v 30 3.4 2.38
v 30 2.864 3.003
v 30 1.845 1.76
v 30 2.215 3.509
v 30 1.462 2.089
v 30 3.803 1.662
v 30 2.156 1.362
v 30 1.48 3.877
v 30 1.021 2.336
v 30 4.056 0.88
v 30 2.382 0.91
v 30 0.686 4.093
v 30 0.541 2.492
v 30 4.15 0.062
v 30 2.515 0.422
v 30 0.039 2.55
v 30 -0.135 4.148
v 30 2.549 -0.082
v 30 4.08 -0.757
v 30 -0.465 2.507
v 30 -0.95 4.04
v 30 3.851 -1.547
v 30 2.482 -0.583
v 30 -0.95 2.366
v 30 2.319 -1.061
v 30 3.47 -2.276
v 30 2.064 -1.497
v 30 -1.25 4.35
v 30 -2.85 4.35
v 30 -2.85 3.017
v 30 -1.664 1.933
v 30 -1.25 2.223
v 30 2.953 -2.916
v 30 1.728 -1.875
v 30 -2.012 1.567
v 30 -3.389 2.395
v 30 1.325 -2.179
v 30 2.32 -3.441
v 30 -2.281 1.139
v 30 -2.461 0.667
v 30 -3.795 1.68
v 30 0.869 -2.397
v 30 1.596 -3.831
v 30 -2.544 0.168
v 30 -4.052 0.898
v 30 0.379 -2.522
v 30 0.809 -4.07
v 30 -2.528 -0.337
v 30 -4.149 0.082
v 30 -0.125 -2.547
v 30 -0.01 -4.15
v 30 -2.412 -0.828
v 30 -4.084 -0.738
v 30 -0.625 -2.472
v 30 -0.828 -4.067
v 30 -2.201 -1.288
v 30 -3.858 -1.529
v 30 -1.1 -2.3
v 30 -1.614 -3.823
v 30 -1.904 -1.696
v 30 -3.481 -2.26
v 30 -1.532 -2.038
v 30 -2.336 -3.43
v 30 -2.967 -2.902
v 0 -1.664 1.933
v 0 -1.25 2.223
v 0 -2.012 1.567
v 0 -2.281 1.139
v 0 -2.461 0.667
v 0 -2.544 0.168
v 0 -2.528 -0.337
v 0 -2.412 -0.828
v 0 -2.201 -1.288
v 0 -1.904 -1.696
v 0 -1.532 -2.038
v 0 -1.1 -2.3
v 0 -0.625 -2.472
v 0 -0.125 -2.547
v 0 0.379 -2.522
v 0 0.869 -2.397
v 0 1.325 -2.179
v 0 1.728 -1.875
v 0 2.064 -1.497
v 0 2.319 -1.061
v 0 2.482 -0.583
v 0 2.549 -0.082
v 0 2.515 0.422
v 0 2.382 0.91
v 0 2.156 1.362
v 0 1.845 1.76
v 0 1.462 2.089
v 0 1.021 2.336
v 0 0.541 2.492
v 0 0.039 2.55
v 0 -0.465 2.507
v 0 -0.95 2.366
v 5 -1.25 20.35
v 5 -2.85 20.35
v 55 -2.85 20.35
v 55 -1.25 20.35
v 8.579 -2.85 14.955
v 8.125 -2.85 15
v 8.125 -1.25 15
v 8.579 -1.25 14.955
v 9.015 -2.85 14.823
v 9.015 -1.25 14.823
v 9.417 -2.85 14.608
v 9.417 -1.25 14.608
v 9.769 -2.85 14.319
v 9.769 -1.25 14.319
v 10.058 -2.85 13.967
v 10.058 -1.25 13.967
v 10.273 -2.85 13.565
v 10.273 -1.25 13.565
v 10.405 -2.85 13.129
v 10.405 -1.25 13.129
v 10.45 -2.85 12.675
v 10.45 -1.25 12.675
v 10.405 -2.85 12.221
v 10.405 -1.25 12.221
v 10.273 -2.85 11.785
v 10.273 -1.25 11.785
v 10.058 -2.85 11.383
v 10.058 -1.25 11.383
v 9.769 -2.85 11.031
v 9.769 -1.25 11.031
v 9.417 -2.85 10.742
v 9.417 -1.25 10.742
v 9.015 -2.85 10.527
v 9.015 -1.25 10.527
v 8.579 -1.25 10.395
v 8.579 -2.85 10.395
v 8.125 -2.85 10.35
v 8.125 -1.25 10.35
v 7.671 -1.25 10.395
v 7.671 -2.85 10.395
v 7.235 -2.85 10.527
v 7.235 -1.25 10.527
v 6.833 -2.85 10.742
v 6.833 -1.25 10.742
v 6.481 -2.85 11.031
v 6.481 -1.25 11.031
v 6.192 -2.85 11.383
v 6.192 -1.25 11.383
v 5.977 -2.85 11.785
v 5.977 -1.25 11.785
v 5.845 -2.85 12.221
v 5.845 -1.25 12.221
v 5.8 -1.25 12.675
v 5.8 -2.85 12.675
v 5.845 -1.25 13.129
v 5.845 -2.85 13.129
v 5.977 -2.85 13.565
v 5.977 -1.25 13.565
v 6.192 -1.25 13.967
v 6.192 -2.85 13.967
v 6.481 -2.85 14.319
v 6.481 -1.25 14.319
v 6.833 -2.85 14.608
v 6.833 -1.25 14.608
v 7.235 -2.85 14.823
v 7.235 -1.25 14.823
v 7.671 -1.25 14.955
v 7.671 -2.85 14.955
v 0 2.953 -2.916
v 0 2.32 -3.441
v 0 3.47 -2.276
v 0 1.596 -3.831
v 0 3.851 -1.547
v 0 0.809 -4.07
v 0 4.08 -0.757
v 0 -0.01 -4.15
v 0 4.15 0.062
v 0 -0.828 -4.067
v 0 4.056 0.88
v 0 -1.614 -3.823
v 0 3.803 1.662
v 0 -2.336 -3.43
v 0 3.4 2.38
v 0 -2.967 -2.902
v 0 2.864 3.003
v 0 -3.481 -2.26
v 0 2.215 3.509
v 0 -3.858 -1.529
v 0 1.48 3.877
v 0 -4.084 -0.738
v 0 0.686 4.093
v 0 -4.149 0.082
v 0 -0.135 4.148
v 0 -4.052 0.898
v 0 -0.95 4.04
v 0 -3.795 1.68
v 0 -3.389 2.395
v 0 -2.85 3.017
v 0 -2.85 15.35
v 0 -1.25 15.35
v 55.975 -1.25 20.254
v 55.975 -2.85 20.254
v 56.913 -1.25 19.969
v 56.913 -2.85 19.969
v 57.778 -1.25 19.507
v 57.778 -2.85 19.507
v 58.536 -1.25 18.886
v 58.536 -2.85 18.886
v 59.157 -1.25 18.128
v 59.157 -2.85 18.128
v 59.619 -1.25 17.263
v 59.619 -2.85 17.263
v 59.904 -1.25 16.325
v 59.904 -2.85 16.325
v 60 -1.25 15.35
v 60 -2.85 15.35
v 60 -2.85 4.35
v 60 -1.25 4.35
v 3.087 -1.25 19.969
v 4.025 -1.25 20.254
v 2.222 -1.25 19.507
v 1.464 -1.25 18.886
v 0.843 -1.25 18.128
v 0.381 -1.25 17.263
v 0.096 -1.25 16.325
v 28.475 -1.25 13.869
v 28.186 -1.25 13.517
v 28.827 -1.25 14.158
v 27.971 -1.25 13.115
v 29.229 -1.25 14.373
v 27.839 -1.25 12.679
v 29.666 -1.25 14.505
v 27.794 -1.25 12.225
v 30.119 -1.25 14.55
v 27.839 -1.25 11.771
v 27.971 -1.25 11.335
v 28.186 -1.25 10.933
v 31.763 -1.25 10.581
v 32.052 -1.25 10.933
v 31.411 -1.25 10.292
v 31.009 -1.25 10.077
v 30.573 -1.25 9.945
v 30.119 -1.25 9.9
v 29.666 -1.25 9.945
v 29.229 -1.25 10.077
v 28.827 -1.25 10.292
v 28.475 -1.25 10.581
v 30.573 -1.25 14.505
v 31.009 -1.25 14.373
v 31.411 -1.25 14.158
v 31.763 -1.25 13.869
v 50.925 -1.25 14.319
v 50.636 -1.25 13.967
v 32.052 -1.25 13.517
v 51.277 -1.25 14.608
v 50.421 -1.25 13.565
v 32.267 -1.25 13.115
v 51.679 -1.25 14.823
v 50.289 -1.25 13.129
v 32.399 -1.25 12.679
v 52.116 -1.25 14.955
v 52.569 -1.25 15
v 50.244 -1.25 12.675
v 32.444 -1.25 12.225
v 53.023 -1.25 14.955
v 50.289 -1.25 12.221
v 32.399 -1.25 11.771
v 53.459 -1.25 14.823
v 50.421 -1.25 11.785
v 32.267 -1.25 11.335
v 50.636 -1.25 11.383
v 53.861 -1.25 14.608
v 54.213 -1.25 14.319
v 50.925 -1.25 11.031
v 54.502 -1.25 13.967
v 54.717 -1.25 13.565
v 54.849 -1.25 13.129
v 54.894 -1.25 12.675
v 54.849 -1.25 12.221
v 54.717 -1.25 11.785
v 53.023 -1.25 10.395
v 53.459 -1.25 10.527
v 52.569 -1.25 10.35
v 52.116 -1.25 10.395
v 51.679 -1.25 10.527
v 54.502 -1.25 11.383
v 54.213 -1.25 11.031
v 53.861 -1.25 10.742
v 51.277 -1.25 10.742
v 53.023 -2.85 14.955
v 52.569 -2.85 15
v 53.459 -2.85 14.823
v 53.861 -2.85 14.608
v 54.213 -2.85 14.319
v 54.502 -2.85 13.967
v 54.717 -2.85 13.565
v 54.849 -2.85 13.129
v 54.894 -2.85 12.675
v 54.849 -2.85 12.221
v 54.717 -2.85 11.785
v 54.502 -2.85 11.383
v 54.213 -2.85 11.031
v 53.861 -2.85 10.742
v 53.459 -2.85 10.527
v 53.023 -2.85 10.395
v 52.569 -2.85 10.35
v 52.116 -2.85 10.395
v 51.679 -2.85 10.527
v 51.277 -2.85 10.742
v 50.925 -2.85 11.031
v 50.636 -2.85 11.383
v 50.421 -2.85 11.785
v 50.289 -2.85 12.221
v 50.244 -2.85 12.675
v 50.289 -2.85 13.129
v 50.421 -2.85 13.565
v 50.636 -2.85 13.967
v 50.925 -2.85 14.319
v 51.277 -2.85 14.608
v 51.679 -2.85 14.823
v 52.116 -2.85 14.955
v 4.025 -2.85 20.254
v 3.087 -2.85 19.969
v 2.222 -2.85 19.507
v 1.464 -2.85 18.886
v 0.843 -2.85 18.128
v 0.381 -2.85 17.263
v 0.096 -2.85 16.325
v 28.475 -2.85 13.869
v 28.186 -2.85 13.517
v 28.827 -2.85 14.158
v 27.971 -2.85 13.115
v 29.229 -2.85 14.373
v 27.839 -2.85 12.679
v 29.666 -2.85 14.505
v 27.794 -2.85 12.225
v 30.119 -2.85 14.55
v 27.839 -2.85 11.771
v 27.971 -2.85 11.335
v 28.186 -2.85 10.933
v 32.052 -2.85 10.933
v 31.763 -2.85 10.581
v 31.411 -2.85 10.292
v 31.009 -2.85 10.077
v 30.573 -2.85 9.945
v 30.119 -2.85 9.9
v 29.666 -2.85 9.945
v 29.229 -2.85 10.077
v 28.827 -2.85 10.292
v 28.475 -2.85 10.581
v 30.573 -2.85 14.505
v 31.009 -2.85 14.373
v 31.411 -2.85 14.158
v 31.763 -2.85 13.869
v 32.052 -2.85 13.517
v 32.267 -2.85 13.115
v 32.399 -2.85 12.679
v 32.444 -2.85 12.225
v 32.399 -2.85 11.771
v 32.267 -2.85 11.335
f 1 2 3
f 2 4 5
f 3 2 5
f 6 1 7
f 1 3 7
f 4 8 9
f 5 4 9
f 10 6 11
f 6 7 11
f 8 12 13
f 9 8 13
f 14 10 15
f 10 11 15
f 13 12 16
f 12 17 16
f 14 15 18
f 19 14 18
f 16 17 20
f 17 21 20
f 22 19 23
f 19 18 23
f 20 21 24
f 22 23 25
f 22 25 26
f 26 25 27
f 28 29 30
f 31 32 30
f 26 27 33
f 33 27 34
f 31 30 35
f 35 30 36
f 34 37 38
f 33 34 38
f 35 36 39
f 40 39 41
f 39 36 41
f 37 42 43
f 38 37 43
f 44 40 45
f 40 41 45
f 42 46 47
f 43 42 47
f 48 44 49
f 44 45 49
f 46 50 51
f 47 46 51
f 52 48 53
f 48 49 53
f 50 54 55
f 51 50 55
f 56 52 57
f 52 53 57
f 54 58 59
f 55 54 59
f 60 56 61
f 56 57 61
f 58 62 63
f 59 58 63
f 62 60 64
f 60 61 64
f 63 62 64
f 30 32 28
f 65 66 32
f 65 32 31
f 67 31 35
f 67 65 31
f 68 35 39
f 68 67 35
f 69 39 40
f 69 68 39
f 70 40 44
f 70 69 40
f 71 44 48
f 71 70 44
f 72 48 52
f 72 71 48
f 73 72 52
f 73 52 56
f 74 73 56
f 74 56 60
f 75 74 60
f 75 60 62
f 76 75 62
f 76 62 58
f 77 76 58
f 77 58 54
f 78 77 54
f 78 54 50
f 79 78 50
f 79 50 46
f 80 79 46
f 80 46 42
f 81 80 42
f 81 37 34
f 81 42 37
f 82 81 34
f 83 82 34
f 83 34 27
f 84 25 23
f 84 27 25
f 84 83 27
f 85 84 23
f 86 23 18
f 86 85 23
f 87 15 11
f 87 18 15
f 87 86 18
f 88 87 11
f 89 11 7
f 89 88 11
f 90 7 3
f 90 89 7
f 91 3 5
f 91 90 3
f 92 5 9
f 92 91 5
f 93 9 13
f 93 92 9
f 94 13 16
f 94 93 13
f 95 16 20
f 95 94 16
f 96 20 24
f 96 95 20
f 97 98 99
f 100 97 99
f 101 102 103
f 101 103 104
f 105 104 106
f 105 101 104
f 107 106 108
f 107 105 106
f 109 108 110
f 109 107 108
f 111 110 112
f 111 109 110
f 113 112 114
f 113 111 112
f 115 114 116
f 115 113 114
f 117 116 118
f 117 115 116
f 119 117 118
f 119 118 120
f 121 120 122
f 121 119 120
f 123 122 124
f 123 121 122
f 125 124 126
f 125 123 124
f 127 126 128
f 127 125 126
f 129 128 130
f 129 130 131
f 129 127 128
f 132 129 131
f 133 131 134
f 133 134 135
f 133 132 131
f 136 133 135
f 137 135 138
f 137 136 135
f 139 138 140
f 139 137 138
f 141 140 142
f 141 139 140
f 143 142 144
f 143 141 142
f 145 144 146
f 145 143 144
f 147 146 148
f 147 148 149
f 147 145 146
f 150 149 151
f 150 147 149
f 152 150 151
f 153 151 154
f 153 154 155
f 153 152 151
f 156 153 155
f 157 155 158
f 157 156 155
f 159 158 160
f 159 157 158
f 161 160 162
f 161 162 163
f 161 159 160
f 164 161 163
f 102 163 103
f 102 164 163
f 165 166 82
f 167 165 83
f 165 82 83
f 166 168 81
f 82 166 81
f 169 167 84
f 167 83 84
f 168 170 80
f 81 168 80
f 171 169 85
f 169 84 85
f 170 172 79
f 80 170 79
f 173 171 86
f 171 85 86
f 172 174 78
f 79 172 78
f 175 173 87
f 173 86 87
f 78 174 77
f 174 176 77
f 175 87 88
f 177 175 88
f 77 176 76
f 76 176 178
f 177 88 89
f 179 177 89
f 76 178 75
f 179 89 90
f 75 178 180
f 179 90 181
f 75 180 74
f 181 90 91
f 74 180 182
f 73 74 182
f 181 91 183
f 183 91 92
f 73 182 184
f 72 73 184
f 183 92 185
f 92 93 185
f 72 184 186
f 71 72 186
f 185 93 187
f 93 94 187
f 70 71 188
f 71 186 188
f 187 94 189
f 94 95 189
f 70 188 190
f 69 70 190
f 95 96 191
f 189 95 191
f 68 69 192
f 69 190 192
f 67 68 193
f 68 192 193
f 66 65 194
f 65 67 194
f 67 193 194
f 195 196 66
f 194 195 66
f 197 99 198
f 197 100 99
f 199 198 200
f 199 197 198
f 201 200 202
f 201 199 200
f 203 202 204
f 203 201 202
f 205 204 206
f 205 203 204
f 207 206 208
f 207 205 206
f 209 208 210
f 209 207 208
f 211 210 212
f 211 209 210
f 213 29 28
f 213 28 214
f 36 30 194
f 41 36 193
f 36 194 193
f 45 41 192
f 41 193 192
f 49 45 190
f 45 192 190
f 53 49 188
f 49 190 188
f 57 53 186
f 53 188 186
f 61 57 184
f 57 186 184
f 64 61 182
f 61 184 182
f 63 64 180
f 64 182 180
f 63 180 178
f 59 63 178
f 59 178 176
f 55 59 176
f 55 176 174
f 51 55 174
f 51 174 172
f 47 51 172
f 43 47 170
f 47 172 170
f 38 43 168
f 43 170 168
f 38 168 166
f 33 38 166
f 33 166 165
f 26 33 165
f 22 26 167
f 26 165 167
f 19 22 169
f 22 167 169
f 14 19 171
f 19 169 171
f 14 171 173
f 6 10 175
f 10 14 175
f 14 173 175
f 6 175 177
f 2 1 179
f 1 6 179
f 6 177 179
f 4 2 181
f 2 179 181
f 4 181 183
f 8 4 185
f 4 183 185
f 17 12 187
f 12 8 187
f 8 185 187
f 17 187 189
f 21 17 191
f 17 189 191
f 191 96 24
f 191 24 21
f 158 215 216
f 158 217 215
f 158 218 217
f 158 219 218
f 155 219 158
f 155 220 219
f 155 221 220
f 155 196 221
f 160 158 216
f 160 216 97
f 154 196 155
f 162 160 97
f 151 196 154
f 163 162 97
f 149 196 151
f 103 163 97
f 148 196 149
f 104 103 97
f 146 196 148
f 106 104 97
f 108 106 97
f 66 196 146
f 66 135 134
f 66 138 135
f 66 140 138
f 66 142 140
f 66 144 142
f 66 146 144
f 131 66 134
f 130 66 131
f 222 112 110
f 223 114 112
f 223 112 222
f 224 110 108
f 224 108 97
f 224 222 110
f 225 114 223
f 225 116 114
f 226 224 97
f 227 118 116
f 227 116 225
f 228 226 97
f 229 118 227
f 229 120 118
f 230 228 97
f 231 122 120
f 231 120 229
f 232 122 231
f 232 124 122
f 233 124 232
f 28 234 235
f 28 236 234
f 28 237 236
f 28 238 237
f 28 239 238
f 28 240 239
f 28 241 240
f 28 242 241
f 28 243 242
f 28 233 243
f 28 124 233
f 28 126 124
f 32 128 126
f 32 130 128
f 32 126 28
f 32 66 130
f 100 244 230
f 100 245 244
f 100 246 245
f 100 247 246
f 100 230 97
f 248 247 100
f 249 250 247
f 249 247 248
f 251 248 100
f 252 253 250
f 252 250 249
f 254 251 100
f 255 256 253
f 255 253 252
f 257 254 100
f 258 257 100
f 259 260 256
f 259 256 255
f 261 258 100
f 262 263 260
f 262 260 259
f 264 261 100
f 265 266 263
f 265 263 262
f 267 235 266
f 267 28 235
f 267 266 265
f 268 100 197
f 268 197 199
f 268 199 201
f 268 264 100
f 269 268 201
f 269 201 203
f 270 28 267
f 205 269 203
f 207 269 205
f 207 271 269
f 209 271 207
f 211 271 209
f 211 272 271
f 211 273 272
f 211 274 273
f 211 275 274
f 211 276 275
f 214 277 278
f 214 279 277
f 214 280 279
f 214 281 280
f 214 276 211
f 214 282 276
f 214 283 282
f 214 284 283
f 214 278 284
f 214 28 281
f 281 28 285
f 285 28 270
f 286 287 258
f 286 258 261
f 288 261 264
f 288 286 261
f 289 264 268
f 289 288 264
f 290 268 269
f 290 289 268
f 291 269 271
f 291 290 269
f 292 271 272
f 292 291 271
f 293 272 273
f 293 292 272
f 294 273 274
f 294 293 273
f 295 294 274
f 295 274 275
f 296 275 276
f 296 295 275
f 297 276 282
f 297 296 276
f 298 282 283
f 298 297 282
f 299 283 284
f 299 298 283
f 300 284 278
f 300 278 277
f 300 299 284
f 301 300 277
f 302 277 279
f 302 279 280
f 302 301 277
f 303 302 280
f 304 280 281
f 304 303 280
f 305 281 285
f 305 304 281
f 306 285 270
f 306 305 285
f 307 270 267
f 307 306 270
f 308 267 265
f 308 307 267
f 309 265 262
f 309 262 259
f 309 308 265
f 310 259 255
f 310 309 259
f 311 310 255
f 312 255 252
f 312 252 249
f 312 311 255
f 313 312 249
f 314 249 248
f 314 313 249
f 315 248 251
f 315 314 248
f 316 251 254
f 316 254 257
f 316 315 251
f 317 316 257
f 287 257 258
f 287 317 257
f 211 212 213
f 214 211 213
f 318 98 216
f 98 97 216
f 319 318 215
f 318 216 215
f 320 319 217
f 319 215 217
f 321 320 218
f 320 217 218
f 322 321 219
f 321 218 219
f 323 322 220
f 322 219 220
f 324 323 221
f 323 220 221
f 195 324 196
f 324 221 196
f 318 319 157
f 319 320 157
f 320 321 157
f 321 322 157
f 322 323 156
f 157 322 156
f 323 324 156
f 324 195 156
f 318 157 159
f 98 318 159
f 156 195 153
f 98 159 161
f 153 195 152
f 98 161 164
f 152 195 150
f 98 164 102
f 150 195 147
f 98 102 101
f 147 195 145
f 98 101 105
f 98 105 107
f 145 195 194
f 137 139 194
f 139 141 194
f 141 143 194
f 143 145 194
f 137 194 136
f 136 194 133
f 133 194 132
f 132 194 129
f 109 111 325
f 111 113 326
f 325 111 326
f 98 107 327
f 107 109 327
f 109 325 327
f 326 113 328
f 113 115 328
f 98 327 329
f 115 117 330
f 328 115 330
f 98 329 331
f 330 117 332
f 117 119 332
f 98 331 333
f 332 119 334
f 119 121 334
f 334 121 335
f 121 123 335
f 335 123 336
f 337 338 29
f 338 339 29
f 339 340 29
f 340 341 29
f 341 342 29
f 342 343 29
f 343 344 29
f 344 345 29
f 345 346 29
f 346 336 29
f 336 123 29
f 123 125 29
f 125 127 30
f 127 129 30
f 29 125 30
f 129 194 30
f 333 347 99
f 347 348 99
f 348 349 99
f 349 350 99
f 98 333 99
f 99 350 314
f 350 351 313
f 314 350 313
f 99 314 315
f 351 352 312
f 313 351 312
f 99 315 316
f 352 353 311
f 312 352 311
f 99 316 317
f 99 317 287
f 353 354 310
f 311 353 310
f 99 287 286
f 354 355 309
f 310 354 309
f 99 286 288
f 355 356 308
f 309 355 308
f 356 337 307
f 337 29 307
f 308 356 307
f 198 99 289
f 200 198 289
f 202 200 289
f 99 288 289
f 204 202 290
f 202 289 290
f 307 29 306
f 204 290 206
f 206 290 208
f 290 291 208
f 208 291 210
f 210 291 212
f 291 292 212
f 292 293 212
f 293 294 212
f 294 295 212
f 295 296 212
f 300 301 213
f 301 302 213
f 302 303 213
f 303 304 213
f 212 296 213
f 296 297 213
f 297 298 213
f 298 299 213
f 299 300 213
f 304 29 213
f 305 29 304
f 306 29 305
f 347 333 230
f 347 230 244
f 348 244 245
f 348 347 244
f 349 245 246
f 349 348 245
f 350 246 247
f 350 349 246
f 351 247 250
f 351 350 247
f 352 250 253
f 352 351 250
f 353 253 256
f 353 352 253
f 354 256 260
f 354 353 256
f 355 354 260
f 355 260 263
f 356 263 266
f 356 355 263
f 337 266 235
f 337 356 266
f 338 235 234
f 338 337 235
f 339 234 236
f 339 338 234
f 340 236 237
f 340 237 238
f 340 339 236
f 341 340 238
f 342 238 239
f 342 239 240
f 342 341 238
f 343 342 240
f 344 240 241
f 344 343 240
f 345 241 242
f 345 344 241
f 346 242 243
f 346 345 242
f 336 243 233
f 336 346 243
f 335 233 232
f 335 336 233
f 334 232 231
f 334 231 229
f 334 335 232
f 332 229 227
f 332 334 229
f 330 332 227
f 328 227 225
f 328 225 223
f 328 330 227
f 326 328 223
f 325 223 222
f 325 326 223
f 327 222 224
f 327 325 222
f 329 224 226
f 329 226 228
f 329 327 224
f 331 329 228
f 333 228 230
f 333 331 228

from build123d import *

# Parameters (mm, degrees)
SKETCH_1_R               = 4.15
EXTRUDE_1_DEPTH          = 60
SKETCH_2_R               = 2.325
EXTRUDE_2_DEPTH          = 1.6
FILLET_1_R               = 5
CUT_EXTRUDE_2_DEPTH      = 64.492873616
CUT_EXTRUDE_1_DEPTH      = 64.586810739
CUT_EXTRUDE_1_DEPTH_BACK = 64.586810739
SKETCH_4_W               = 30
SKETCH_4_H               = 8.5


with BuildPart() as part:
    # Эскиз1 → Бобышка-Вытянуть1 (new body)
    with BuildSketch(Plane(origin=(0, 0, 0), x_dir=(0, 0, -1), z_dir=(1, 0, 0))):
        Circle(SKETCH_1_R)
    extrude(amount=EXTRUDE_1_DEPTH)

    # Эскиз2 → Бобышка-Вытянуть2 (add)
    with BuildSketch(Plane(origin=(0, -2.85, 0), x_dir=(1, 0, 0), z_dir=(0, 1, 0))):
        Polygon((0, -4.15), (0, -20.35), (60, -20.35), (60, -4.15), (60, 0), (0, 0), align=None)
        with Locations(Location((8.125, -12.675, 0), (0, 0, 270))):
            Circle(SKETCH_2_R, mode=Mode.SUBTRACT)
        with Locations(Location((30.119163283, -12.225, 0), (0, 0, 270))):
            Circle(SKETCH_2_R, mode=Mode.SUBTRACT)
        with Locations(Location((52.569163283, -12.675, 0), (0, 0, 270))):
            Circle(SKETCH_2_R, mode=Mode.SUBTRACT)
    extrude(amount=EXTRUDE_2_DEPTH)

    # Скругление1
    fillet_1_edges = [part.edges().sort_by_distance(p)[0] for p in [
        (0, -2.05, 20.35),
        (60, -2.05, 20.35),
    ]]
    fillet(fillet_1_edges, radius=FILLET_1_R)

    # Эскиз5 → Вырез-Вытянуть2 (cut, through all)
    with BuildSketch(Plane.ZY):
        with BuildLine():
            Line((3.957271787, -1.25), (2.222611077, -1.25))
            ThreePointArc((2.222611077, -1.25), (-2.299419251, 1.102347998), (2.366431913, -0.95))
            Line((2.366431913, -0.95), (4.039801975, -0.95))
            Line((4.039801975, -0.95), (4.039801975, -1.25))
            Line((4.039801975, -1.25), (3.957271787, -1.25))
        make_face()
    extrude(amount=-CUT_EXTRUDE_2_DEPTH, mode=Mode.SUBTRACT)

    # Эскиз4 → Вырез-Вытянуть1 (cut, two sides: drawn at the far end of the back side and taken through both)
    with BuildSketch(Plane(origin=(0, -1.25, 0), x_dir=(1, 0, 0), z_dir=(0, 1, 0)).offset(-CUT_EXTRUDE_1_DEPTH_BACK)):
        with Locations((45, -0.1)):
            Rectangle(SKETCH_4_W, SKETCH_4_H)
    extrude(amount=CUT_EXTRUDE_1_DEPTH + CUT_EXTRUDE_1_DEPTH_BACK, mode=Mode.SUBTRACT)


solid = part.part
